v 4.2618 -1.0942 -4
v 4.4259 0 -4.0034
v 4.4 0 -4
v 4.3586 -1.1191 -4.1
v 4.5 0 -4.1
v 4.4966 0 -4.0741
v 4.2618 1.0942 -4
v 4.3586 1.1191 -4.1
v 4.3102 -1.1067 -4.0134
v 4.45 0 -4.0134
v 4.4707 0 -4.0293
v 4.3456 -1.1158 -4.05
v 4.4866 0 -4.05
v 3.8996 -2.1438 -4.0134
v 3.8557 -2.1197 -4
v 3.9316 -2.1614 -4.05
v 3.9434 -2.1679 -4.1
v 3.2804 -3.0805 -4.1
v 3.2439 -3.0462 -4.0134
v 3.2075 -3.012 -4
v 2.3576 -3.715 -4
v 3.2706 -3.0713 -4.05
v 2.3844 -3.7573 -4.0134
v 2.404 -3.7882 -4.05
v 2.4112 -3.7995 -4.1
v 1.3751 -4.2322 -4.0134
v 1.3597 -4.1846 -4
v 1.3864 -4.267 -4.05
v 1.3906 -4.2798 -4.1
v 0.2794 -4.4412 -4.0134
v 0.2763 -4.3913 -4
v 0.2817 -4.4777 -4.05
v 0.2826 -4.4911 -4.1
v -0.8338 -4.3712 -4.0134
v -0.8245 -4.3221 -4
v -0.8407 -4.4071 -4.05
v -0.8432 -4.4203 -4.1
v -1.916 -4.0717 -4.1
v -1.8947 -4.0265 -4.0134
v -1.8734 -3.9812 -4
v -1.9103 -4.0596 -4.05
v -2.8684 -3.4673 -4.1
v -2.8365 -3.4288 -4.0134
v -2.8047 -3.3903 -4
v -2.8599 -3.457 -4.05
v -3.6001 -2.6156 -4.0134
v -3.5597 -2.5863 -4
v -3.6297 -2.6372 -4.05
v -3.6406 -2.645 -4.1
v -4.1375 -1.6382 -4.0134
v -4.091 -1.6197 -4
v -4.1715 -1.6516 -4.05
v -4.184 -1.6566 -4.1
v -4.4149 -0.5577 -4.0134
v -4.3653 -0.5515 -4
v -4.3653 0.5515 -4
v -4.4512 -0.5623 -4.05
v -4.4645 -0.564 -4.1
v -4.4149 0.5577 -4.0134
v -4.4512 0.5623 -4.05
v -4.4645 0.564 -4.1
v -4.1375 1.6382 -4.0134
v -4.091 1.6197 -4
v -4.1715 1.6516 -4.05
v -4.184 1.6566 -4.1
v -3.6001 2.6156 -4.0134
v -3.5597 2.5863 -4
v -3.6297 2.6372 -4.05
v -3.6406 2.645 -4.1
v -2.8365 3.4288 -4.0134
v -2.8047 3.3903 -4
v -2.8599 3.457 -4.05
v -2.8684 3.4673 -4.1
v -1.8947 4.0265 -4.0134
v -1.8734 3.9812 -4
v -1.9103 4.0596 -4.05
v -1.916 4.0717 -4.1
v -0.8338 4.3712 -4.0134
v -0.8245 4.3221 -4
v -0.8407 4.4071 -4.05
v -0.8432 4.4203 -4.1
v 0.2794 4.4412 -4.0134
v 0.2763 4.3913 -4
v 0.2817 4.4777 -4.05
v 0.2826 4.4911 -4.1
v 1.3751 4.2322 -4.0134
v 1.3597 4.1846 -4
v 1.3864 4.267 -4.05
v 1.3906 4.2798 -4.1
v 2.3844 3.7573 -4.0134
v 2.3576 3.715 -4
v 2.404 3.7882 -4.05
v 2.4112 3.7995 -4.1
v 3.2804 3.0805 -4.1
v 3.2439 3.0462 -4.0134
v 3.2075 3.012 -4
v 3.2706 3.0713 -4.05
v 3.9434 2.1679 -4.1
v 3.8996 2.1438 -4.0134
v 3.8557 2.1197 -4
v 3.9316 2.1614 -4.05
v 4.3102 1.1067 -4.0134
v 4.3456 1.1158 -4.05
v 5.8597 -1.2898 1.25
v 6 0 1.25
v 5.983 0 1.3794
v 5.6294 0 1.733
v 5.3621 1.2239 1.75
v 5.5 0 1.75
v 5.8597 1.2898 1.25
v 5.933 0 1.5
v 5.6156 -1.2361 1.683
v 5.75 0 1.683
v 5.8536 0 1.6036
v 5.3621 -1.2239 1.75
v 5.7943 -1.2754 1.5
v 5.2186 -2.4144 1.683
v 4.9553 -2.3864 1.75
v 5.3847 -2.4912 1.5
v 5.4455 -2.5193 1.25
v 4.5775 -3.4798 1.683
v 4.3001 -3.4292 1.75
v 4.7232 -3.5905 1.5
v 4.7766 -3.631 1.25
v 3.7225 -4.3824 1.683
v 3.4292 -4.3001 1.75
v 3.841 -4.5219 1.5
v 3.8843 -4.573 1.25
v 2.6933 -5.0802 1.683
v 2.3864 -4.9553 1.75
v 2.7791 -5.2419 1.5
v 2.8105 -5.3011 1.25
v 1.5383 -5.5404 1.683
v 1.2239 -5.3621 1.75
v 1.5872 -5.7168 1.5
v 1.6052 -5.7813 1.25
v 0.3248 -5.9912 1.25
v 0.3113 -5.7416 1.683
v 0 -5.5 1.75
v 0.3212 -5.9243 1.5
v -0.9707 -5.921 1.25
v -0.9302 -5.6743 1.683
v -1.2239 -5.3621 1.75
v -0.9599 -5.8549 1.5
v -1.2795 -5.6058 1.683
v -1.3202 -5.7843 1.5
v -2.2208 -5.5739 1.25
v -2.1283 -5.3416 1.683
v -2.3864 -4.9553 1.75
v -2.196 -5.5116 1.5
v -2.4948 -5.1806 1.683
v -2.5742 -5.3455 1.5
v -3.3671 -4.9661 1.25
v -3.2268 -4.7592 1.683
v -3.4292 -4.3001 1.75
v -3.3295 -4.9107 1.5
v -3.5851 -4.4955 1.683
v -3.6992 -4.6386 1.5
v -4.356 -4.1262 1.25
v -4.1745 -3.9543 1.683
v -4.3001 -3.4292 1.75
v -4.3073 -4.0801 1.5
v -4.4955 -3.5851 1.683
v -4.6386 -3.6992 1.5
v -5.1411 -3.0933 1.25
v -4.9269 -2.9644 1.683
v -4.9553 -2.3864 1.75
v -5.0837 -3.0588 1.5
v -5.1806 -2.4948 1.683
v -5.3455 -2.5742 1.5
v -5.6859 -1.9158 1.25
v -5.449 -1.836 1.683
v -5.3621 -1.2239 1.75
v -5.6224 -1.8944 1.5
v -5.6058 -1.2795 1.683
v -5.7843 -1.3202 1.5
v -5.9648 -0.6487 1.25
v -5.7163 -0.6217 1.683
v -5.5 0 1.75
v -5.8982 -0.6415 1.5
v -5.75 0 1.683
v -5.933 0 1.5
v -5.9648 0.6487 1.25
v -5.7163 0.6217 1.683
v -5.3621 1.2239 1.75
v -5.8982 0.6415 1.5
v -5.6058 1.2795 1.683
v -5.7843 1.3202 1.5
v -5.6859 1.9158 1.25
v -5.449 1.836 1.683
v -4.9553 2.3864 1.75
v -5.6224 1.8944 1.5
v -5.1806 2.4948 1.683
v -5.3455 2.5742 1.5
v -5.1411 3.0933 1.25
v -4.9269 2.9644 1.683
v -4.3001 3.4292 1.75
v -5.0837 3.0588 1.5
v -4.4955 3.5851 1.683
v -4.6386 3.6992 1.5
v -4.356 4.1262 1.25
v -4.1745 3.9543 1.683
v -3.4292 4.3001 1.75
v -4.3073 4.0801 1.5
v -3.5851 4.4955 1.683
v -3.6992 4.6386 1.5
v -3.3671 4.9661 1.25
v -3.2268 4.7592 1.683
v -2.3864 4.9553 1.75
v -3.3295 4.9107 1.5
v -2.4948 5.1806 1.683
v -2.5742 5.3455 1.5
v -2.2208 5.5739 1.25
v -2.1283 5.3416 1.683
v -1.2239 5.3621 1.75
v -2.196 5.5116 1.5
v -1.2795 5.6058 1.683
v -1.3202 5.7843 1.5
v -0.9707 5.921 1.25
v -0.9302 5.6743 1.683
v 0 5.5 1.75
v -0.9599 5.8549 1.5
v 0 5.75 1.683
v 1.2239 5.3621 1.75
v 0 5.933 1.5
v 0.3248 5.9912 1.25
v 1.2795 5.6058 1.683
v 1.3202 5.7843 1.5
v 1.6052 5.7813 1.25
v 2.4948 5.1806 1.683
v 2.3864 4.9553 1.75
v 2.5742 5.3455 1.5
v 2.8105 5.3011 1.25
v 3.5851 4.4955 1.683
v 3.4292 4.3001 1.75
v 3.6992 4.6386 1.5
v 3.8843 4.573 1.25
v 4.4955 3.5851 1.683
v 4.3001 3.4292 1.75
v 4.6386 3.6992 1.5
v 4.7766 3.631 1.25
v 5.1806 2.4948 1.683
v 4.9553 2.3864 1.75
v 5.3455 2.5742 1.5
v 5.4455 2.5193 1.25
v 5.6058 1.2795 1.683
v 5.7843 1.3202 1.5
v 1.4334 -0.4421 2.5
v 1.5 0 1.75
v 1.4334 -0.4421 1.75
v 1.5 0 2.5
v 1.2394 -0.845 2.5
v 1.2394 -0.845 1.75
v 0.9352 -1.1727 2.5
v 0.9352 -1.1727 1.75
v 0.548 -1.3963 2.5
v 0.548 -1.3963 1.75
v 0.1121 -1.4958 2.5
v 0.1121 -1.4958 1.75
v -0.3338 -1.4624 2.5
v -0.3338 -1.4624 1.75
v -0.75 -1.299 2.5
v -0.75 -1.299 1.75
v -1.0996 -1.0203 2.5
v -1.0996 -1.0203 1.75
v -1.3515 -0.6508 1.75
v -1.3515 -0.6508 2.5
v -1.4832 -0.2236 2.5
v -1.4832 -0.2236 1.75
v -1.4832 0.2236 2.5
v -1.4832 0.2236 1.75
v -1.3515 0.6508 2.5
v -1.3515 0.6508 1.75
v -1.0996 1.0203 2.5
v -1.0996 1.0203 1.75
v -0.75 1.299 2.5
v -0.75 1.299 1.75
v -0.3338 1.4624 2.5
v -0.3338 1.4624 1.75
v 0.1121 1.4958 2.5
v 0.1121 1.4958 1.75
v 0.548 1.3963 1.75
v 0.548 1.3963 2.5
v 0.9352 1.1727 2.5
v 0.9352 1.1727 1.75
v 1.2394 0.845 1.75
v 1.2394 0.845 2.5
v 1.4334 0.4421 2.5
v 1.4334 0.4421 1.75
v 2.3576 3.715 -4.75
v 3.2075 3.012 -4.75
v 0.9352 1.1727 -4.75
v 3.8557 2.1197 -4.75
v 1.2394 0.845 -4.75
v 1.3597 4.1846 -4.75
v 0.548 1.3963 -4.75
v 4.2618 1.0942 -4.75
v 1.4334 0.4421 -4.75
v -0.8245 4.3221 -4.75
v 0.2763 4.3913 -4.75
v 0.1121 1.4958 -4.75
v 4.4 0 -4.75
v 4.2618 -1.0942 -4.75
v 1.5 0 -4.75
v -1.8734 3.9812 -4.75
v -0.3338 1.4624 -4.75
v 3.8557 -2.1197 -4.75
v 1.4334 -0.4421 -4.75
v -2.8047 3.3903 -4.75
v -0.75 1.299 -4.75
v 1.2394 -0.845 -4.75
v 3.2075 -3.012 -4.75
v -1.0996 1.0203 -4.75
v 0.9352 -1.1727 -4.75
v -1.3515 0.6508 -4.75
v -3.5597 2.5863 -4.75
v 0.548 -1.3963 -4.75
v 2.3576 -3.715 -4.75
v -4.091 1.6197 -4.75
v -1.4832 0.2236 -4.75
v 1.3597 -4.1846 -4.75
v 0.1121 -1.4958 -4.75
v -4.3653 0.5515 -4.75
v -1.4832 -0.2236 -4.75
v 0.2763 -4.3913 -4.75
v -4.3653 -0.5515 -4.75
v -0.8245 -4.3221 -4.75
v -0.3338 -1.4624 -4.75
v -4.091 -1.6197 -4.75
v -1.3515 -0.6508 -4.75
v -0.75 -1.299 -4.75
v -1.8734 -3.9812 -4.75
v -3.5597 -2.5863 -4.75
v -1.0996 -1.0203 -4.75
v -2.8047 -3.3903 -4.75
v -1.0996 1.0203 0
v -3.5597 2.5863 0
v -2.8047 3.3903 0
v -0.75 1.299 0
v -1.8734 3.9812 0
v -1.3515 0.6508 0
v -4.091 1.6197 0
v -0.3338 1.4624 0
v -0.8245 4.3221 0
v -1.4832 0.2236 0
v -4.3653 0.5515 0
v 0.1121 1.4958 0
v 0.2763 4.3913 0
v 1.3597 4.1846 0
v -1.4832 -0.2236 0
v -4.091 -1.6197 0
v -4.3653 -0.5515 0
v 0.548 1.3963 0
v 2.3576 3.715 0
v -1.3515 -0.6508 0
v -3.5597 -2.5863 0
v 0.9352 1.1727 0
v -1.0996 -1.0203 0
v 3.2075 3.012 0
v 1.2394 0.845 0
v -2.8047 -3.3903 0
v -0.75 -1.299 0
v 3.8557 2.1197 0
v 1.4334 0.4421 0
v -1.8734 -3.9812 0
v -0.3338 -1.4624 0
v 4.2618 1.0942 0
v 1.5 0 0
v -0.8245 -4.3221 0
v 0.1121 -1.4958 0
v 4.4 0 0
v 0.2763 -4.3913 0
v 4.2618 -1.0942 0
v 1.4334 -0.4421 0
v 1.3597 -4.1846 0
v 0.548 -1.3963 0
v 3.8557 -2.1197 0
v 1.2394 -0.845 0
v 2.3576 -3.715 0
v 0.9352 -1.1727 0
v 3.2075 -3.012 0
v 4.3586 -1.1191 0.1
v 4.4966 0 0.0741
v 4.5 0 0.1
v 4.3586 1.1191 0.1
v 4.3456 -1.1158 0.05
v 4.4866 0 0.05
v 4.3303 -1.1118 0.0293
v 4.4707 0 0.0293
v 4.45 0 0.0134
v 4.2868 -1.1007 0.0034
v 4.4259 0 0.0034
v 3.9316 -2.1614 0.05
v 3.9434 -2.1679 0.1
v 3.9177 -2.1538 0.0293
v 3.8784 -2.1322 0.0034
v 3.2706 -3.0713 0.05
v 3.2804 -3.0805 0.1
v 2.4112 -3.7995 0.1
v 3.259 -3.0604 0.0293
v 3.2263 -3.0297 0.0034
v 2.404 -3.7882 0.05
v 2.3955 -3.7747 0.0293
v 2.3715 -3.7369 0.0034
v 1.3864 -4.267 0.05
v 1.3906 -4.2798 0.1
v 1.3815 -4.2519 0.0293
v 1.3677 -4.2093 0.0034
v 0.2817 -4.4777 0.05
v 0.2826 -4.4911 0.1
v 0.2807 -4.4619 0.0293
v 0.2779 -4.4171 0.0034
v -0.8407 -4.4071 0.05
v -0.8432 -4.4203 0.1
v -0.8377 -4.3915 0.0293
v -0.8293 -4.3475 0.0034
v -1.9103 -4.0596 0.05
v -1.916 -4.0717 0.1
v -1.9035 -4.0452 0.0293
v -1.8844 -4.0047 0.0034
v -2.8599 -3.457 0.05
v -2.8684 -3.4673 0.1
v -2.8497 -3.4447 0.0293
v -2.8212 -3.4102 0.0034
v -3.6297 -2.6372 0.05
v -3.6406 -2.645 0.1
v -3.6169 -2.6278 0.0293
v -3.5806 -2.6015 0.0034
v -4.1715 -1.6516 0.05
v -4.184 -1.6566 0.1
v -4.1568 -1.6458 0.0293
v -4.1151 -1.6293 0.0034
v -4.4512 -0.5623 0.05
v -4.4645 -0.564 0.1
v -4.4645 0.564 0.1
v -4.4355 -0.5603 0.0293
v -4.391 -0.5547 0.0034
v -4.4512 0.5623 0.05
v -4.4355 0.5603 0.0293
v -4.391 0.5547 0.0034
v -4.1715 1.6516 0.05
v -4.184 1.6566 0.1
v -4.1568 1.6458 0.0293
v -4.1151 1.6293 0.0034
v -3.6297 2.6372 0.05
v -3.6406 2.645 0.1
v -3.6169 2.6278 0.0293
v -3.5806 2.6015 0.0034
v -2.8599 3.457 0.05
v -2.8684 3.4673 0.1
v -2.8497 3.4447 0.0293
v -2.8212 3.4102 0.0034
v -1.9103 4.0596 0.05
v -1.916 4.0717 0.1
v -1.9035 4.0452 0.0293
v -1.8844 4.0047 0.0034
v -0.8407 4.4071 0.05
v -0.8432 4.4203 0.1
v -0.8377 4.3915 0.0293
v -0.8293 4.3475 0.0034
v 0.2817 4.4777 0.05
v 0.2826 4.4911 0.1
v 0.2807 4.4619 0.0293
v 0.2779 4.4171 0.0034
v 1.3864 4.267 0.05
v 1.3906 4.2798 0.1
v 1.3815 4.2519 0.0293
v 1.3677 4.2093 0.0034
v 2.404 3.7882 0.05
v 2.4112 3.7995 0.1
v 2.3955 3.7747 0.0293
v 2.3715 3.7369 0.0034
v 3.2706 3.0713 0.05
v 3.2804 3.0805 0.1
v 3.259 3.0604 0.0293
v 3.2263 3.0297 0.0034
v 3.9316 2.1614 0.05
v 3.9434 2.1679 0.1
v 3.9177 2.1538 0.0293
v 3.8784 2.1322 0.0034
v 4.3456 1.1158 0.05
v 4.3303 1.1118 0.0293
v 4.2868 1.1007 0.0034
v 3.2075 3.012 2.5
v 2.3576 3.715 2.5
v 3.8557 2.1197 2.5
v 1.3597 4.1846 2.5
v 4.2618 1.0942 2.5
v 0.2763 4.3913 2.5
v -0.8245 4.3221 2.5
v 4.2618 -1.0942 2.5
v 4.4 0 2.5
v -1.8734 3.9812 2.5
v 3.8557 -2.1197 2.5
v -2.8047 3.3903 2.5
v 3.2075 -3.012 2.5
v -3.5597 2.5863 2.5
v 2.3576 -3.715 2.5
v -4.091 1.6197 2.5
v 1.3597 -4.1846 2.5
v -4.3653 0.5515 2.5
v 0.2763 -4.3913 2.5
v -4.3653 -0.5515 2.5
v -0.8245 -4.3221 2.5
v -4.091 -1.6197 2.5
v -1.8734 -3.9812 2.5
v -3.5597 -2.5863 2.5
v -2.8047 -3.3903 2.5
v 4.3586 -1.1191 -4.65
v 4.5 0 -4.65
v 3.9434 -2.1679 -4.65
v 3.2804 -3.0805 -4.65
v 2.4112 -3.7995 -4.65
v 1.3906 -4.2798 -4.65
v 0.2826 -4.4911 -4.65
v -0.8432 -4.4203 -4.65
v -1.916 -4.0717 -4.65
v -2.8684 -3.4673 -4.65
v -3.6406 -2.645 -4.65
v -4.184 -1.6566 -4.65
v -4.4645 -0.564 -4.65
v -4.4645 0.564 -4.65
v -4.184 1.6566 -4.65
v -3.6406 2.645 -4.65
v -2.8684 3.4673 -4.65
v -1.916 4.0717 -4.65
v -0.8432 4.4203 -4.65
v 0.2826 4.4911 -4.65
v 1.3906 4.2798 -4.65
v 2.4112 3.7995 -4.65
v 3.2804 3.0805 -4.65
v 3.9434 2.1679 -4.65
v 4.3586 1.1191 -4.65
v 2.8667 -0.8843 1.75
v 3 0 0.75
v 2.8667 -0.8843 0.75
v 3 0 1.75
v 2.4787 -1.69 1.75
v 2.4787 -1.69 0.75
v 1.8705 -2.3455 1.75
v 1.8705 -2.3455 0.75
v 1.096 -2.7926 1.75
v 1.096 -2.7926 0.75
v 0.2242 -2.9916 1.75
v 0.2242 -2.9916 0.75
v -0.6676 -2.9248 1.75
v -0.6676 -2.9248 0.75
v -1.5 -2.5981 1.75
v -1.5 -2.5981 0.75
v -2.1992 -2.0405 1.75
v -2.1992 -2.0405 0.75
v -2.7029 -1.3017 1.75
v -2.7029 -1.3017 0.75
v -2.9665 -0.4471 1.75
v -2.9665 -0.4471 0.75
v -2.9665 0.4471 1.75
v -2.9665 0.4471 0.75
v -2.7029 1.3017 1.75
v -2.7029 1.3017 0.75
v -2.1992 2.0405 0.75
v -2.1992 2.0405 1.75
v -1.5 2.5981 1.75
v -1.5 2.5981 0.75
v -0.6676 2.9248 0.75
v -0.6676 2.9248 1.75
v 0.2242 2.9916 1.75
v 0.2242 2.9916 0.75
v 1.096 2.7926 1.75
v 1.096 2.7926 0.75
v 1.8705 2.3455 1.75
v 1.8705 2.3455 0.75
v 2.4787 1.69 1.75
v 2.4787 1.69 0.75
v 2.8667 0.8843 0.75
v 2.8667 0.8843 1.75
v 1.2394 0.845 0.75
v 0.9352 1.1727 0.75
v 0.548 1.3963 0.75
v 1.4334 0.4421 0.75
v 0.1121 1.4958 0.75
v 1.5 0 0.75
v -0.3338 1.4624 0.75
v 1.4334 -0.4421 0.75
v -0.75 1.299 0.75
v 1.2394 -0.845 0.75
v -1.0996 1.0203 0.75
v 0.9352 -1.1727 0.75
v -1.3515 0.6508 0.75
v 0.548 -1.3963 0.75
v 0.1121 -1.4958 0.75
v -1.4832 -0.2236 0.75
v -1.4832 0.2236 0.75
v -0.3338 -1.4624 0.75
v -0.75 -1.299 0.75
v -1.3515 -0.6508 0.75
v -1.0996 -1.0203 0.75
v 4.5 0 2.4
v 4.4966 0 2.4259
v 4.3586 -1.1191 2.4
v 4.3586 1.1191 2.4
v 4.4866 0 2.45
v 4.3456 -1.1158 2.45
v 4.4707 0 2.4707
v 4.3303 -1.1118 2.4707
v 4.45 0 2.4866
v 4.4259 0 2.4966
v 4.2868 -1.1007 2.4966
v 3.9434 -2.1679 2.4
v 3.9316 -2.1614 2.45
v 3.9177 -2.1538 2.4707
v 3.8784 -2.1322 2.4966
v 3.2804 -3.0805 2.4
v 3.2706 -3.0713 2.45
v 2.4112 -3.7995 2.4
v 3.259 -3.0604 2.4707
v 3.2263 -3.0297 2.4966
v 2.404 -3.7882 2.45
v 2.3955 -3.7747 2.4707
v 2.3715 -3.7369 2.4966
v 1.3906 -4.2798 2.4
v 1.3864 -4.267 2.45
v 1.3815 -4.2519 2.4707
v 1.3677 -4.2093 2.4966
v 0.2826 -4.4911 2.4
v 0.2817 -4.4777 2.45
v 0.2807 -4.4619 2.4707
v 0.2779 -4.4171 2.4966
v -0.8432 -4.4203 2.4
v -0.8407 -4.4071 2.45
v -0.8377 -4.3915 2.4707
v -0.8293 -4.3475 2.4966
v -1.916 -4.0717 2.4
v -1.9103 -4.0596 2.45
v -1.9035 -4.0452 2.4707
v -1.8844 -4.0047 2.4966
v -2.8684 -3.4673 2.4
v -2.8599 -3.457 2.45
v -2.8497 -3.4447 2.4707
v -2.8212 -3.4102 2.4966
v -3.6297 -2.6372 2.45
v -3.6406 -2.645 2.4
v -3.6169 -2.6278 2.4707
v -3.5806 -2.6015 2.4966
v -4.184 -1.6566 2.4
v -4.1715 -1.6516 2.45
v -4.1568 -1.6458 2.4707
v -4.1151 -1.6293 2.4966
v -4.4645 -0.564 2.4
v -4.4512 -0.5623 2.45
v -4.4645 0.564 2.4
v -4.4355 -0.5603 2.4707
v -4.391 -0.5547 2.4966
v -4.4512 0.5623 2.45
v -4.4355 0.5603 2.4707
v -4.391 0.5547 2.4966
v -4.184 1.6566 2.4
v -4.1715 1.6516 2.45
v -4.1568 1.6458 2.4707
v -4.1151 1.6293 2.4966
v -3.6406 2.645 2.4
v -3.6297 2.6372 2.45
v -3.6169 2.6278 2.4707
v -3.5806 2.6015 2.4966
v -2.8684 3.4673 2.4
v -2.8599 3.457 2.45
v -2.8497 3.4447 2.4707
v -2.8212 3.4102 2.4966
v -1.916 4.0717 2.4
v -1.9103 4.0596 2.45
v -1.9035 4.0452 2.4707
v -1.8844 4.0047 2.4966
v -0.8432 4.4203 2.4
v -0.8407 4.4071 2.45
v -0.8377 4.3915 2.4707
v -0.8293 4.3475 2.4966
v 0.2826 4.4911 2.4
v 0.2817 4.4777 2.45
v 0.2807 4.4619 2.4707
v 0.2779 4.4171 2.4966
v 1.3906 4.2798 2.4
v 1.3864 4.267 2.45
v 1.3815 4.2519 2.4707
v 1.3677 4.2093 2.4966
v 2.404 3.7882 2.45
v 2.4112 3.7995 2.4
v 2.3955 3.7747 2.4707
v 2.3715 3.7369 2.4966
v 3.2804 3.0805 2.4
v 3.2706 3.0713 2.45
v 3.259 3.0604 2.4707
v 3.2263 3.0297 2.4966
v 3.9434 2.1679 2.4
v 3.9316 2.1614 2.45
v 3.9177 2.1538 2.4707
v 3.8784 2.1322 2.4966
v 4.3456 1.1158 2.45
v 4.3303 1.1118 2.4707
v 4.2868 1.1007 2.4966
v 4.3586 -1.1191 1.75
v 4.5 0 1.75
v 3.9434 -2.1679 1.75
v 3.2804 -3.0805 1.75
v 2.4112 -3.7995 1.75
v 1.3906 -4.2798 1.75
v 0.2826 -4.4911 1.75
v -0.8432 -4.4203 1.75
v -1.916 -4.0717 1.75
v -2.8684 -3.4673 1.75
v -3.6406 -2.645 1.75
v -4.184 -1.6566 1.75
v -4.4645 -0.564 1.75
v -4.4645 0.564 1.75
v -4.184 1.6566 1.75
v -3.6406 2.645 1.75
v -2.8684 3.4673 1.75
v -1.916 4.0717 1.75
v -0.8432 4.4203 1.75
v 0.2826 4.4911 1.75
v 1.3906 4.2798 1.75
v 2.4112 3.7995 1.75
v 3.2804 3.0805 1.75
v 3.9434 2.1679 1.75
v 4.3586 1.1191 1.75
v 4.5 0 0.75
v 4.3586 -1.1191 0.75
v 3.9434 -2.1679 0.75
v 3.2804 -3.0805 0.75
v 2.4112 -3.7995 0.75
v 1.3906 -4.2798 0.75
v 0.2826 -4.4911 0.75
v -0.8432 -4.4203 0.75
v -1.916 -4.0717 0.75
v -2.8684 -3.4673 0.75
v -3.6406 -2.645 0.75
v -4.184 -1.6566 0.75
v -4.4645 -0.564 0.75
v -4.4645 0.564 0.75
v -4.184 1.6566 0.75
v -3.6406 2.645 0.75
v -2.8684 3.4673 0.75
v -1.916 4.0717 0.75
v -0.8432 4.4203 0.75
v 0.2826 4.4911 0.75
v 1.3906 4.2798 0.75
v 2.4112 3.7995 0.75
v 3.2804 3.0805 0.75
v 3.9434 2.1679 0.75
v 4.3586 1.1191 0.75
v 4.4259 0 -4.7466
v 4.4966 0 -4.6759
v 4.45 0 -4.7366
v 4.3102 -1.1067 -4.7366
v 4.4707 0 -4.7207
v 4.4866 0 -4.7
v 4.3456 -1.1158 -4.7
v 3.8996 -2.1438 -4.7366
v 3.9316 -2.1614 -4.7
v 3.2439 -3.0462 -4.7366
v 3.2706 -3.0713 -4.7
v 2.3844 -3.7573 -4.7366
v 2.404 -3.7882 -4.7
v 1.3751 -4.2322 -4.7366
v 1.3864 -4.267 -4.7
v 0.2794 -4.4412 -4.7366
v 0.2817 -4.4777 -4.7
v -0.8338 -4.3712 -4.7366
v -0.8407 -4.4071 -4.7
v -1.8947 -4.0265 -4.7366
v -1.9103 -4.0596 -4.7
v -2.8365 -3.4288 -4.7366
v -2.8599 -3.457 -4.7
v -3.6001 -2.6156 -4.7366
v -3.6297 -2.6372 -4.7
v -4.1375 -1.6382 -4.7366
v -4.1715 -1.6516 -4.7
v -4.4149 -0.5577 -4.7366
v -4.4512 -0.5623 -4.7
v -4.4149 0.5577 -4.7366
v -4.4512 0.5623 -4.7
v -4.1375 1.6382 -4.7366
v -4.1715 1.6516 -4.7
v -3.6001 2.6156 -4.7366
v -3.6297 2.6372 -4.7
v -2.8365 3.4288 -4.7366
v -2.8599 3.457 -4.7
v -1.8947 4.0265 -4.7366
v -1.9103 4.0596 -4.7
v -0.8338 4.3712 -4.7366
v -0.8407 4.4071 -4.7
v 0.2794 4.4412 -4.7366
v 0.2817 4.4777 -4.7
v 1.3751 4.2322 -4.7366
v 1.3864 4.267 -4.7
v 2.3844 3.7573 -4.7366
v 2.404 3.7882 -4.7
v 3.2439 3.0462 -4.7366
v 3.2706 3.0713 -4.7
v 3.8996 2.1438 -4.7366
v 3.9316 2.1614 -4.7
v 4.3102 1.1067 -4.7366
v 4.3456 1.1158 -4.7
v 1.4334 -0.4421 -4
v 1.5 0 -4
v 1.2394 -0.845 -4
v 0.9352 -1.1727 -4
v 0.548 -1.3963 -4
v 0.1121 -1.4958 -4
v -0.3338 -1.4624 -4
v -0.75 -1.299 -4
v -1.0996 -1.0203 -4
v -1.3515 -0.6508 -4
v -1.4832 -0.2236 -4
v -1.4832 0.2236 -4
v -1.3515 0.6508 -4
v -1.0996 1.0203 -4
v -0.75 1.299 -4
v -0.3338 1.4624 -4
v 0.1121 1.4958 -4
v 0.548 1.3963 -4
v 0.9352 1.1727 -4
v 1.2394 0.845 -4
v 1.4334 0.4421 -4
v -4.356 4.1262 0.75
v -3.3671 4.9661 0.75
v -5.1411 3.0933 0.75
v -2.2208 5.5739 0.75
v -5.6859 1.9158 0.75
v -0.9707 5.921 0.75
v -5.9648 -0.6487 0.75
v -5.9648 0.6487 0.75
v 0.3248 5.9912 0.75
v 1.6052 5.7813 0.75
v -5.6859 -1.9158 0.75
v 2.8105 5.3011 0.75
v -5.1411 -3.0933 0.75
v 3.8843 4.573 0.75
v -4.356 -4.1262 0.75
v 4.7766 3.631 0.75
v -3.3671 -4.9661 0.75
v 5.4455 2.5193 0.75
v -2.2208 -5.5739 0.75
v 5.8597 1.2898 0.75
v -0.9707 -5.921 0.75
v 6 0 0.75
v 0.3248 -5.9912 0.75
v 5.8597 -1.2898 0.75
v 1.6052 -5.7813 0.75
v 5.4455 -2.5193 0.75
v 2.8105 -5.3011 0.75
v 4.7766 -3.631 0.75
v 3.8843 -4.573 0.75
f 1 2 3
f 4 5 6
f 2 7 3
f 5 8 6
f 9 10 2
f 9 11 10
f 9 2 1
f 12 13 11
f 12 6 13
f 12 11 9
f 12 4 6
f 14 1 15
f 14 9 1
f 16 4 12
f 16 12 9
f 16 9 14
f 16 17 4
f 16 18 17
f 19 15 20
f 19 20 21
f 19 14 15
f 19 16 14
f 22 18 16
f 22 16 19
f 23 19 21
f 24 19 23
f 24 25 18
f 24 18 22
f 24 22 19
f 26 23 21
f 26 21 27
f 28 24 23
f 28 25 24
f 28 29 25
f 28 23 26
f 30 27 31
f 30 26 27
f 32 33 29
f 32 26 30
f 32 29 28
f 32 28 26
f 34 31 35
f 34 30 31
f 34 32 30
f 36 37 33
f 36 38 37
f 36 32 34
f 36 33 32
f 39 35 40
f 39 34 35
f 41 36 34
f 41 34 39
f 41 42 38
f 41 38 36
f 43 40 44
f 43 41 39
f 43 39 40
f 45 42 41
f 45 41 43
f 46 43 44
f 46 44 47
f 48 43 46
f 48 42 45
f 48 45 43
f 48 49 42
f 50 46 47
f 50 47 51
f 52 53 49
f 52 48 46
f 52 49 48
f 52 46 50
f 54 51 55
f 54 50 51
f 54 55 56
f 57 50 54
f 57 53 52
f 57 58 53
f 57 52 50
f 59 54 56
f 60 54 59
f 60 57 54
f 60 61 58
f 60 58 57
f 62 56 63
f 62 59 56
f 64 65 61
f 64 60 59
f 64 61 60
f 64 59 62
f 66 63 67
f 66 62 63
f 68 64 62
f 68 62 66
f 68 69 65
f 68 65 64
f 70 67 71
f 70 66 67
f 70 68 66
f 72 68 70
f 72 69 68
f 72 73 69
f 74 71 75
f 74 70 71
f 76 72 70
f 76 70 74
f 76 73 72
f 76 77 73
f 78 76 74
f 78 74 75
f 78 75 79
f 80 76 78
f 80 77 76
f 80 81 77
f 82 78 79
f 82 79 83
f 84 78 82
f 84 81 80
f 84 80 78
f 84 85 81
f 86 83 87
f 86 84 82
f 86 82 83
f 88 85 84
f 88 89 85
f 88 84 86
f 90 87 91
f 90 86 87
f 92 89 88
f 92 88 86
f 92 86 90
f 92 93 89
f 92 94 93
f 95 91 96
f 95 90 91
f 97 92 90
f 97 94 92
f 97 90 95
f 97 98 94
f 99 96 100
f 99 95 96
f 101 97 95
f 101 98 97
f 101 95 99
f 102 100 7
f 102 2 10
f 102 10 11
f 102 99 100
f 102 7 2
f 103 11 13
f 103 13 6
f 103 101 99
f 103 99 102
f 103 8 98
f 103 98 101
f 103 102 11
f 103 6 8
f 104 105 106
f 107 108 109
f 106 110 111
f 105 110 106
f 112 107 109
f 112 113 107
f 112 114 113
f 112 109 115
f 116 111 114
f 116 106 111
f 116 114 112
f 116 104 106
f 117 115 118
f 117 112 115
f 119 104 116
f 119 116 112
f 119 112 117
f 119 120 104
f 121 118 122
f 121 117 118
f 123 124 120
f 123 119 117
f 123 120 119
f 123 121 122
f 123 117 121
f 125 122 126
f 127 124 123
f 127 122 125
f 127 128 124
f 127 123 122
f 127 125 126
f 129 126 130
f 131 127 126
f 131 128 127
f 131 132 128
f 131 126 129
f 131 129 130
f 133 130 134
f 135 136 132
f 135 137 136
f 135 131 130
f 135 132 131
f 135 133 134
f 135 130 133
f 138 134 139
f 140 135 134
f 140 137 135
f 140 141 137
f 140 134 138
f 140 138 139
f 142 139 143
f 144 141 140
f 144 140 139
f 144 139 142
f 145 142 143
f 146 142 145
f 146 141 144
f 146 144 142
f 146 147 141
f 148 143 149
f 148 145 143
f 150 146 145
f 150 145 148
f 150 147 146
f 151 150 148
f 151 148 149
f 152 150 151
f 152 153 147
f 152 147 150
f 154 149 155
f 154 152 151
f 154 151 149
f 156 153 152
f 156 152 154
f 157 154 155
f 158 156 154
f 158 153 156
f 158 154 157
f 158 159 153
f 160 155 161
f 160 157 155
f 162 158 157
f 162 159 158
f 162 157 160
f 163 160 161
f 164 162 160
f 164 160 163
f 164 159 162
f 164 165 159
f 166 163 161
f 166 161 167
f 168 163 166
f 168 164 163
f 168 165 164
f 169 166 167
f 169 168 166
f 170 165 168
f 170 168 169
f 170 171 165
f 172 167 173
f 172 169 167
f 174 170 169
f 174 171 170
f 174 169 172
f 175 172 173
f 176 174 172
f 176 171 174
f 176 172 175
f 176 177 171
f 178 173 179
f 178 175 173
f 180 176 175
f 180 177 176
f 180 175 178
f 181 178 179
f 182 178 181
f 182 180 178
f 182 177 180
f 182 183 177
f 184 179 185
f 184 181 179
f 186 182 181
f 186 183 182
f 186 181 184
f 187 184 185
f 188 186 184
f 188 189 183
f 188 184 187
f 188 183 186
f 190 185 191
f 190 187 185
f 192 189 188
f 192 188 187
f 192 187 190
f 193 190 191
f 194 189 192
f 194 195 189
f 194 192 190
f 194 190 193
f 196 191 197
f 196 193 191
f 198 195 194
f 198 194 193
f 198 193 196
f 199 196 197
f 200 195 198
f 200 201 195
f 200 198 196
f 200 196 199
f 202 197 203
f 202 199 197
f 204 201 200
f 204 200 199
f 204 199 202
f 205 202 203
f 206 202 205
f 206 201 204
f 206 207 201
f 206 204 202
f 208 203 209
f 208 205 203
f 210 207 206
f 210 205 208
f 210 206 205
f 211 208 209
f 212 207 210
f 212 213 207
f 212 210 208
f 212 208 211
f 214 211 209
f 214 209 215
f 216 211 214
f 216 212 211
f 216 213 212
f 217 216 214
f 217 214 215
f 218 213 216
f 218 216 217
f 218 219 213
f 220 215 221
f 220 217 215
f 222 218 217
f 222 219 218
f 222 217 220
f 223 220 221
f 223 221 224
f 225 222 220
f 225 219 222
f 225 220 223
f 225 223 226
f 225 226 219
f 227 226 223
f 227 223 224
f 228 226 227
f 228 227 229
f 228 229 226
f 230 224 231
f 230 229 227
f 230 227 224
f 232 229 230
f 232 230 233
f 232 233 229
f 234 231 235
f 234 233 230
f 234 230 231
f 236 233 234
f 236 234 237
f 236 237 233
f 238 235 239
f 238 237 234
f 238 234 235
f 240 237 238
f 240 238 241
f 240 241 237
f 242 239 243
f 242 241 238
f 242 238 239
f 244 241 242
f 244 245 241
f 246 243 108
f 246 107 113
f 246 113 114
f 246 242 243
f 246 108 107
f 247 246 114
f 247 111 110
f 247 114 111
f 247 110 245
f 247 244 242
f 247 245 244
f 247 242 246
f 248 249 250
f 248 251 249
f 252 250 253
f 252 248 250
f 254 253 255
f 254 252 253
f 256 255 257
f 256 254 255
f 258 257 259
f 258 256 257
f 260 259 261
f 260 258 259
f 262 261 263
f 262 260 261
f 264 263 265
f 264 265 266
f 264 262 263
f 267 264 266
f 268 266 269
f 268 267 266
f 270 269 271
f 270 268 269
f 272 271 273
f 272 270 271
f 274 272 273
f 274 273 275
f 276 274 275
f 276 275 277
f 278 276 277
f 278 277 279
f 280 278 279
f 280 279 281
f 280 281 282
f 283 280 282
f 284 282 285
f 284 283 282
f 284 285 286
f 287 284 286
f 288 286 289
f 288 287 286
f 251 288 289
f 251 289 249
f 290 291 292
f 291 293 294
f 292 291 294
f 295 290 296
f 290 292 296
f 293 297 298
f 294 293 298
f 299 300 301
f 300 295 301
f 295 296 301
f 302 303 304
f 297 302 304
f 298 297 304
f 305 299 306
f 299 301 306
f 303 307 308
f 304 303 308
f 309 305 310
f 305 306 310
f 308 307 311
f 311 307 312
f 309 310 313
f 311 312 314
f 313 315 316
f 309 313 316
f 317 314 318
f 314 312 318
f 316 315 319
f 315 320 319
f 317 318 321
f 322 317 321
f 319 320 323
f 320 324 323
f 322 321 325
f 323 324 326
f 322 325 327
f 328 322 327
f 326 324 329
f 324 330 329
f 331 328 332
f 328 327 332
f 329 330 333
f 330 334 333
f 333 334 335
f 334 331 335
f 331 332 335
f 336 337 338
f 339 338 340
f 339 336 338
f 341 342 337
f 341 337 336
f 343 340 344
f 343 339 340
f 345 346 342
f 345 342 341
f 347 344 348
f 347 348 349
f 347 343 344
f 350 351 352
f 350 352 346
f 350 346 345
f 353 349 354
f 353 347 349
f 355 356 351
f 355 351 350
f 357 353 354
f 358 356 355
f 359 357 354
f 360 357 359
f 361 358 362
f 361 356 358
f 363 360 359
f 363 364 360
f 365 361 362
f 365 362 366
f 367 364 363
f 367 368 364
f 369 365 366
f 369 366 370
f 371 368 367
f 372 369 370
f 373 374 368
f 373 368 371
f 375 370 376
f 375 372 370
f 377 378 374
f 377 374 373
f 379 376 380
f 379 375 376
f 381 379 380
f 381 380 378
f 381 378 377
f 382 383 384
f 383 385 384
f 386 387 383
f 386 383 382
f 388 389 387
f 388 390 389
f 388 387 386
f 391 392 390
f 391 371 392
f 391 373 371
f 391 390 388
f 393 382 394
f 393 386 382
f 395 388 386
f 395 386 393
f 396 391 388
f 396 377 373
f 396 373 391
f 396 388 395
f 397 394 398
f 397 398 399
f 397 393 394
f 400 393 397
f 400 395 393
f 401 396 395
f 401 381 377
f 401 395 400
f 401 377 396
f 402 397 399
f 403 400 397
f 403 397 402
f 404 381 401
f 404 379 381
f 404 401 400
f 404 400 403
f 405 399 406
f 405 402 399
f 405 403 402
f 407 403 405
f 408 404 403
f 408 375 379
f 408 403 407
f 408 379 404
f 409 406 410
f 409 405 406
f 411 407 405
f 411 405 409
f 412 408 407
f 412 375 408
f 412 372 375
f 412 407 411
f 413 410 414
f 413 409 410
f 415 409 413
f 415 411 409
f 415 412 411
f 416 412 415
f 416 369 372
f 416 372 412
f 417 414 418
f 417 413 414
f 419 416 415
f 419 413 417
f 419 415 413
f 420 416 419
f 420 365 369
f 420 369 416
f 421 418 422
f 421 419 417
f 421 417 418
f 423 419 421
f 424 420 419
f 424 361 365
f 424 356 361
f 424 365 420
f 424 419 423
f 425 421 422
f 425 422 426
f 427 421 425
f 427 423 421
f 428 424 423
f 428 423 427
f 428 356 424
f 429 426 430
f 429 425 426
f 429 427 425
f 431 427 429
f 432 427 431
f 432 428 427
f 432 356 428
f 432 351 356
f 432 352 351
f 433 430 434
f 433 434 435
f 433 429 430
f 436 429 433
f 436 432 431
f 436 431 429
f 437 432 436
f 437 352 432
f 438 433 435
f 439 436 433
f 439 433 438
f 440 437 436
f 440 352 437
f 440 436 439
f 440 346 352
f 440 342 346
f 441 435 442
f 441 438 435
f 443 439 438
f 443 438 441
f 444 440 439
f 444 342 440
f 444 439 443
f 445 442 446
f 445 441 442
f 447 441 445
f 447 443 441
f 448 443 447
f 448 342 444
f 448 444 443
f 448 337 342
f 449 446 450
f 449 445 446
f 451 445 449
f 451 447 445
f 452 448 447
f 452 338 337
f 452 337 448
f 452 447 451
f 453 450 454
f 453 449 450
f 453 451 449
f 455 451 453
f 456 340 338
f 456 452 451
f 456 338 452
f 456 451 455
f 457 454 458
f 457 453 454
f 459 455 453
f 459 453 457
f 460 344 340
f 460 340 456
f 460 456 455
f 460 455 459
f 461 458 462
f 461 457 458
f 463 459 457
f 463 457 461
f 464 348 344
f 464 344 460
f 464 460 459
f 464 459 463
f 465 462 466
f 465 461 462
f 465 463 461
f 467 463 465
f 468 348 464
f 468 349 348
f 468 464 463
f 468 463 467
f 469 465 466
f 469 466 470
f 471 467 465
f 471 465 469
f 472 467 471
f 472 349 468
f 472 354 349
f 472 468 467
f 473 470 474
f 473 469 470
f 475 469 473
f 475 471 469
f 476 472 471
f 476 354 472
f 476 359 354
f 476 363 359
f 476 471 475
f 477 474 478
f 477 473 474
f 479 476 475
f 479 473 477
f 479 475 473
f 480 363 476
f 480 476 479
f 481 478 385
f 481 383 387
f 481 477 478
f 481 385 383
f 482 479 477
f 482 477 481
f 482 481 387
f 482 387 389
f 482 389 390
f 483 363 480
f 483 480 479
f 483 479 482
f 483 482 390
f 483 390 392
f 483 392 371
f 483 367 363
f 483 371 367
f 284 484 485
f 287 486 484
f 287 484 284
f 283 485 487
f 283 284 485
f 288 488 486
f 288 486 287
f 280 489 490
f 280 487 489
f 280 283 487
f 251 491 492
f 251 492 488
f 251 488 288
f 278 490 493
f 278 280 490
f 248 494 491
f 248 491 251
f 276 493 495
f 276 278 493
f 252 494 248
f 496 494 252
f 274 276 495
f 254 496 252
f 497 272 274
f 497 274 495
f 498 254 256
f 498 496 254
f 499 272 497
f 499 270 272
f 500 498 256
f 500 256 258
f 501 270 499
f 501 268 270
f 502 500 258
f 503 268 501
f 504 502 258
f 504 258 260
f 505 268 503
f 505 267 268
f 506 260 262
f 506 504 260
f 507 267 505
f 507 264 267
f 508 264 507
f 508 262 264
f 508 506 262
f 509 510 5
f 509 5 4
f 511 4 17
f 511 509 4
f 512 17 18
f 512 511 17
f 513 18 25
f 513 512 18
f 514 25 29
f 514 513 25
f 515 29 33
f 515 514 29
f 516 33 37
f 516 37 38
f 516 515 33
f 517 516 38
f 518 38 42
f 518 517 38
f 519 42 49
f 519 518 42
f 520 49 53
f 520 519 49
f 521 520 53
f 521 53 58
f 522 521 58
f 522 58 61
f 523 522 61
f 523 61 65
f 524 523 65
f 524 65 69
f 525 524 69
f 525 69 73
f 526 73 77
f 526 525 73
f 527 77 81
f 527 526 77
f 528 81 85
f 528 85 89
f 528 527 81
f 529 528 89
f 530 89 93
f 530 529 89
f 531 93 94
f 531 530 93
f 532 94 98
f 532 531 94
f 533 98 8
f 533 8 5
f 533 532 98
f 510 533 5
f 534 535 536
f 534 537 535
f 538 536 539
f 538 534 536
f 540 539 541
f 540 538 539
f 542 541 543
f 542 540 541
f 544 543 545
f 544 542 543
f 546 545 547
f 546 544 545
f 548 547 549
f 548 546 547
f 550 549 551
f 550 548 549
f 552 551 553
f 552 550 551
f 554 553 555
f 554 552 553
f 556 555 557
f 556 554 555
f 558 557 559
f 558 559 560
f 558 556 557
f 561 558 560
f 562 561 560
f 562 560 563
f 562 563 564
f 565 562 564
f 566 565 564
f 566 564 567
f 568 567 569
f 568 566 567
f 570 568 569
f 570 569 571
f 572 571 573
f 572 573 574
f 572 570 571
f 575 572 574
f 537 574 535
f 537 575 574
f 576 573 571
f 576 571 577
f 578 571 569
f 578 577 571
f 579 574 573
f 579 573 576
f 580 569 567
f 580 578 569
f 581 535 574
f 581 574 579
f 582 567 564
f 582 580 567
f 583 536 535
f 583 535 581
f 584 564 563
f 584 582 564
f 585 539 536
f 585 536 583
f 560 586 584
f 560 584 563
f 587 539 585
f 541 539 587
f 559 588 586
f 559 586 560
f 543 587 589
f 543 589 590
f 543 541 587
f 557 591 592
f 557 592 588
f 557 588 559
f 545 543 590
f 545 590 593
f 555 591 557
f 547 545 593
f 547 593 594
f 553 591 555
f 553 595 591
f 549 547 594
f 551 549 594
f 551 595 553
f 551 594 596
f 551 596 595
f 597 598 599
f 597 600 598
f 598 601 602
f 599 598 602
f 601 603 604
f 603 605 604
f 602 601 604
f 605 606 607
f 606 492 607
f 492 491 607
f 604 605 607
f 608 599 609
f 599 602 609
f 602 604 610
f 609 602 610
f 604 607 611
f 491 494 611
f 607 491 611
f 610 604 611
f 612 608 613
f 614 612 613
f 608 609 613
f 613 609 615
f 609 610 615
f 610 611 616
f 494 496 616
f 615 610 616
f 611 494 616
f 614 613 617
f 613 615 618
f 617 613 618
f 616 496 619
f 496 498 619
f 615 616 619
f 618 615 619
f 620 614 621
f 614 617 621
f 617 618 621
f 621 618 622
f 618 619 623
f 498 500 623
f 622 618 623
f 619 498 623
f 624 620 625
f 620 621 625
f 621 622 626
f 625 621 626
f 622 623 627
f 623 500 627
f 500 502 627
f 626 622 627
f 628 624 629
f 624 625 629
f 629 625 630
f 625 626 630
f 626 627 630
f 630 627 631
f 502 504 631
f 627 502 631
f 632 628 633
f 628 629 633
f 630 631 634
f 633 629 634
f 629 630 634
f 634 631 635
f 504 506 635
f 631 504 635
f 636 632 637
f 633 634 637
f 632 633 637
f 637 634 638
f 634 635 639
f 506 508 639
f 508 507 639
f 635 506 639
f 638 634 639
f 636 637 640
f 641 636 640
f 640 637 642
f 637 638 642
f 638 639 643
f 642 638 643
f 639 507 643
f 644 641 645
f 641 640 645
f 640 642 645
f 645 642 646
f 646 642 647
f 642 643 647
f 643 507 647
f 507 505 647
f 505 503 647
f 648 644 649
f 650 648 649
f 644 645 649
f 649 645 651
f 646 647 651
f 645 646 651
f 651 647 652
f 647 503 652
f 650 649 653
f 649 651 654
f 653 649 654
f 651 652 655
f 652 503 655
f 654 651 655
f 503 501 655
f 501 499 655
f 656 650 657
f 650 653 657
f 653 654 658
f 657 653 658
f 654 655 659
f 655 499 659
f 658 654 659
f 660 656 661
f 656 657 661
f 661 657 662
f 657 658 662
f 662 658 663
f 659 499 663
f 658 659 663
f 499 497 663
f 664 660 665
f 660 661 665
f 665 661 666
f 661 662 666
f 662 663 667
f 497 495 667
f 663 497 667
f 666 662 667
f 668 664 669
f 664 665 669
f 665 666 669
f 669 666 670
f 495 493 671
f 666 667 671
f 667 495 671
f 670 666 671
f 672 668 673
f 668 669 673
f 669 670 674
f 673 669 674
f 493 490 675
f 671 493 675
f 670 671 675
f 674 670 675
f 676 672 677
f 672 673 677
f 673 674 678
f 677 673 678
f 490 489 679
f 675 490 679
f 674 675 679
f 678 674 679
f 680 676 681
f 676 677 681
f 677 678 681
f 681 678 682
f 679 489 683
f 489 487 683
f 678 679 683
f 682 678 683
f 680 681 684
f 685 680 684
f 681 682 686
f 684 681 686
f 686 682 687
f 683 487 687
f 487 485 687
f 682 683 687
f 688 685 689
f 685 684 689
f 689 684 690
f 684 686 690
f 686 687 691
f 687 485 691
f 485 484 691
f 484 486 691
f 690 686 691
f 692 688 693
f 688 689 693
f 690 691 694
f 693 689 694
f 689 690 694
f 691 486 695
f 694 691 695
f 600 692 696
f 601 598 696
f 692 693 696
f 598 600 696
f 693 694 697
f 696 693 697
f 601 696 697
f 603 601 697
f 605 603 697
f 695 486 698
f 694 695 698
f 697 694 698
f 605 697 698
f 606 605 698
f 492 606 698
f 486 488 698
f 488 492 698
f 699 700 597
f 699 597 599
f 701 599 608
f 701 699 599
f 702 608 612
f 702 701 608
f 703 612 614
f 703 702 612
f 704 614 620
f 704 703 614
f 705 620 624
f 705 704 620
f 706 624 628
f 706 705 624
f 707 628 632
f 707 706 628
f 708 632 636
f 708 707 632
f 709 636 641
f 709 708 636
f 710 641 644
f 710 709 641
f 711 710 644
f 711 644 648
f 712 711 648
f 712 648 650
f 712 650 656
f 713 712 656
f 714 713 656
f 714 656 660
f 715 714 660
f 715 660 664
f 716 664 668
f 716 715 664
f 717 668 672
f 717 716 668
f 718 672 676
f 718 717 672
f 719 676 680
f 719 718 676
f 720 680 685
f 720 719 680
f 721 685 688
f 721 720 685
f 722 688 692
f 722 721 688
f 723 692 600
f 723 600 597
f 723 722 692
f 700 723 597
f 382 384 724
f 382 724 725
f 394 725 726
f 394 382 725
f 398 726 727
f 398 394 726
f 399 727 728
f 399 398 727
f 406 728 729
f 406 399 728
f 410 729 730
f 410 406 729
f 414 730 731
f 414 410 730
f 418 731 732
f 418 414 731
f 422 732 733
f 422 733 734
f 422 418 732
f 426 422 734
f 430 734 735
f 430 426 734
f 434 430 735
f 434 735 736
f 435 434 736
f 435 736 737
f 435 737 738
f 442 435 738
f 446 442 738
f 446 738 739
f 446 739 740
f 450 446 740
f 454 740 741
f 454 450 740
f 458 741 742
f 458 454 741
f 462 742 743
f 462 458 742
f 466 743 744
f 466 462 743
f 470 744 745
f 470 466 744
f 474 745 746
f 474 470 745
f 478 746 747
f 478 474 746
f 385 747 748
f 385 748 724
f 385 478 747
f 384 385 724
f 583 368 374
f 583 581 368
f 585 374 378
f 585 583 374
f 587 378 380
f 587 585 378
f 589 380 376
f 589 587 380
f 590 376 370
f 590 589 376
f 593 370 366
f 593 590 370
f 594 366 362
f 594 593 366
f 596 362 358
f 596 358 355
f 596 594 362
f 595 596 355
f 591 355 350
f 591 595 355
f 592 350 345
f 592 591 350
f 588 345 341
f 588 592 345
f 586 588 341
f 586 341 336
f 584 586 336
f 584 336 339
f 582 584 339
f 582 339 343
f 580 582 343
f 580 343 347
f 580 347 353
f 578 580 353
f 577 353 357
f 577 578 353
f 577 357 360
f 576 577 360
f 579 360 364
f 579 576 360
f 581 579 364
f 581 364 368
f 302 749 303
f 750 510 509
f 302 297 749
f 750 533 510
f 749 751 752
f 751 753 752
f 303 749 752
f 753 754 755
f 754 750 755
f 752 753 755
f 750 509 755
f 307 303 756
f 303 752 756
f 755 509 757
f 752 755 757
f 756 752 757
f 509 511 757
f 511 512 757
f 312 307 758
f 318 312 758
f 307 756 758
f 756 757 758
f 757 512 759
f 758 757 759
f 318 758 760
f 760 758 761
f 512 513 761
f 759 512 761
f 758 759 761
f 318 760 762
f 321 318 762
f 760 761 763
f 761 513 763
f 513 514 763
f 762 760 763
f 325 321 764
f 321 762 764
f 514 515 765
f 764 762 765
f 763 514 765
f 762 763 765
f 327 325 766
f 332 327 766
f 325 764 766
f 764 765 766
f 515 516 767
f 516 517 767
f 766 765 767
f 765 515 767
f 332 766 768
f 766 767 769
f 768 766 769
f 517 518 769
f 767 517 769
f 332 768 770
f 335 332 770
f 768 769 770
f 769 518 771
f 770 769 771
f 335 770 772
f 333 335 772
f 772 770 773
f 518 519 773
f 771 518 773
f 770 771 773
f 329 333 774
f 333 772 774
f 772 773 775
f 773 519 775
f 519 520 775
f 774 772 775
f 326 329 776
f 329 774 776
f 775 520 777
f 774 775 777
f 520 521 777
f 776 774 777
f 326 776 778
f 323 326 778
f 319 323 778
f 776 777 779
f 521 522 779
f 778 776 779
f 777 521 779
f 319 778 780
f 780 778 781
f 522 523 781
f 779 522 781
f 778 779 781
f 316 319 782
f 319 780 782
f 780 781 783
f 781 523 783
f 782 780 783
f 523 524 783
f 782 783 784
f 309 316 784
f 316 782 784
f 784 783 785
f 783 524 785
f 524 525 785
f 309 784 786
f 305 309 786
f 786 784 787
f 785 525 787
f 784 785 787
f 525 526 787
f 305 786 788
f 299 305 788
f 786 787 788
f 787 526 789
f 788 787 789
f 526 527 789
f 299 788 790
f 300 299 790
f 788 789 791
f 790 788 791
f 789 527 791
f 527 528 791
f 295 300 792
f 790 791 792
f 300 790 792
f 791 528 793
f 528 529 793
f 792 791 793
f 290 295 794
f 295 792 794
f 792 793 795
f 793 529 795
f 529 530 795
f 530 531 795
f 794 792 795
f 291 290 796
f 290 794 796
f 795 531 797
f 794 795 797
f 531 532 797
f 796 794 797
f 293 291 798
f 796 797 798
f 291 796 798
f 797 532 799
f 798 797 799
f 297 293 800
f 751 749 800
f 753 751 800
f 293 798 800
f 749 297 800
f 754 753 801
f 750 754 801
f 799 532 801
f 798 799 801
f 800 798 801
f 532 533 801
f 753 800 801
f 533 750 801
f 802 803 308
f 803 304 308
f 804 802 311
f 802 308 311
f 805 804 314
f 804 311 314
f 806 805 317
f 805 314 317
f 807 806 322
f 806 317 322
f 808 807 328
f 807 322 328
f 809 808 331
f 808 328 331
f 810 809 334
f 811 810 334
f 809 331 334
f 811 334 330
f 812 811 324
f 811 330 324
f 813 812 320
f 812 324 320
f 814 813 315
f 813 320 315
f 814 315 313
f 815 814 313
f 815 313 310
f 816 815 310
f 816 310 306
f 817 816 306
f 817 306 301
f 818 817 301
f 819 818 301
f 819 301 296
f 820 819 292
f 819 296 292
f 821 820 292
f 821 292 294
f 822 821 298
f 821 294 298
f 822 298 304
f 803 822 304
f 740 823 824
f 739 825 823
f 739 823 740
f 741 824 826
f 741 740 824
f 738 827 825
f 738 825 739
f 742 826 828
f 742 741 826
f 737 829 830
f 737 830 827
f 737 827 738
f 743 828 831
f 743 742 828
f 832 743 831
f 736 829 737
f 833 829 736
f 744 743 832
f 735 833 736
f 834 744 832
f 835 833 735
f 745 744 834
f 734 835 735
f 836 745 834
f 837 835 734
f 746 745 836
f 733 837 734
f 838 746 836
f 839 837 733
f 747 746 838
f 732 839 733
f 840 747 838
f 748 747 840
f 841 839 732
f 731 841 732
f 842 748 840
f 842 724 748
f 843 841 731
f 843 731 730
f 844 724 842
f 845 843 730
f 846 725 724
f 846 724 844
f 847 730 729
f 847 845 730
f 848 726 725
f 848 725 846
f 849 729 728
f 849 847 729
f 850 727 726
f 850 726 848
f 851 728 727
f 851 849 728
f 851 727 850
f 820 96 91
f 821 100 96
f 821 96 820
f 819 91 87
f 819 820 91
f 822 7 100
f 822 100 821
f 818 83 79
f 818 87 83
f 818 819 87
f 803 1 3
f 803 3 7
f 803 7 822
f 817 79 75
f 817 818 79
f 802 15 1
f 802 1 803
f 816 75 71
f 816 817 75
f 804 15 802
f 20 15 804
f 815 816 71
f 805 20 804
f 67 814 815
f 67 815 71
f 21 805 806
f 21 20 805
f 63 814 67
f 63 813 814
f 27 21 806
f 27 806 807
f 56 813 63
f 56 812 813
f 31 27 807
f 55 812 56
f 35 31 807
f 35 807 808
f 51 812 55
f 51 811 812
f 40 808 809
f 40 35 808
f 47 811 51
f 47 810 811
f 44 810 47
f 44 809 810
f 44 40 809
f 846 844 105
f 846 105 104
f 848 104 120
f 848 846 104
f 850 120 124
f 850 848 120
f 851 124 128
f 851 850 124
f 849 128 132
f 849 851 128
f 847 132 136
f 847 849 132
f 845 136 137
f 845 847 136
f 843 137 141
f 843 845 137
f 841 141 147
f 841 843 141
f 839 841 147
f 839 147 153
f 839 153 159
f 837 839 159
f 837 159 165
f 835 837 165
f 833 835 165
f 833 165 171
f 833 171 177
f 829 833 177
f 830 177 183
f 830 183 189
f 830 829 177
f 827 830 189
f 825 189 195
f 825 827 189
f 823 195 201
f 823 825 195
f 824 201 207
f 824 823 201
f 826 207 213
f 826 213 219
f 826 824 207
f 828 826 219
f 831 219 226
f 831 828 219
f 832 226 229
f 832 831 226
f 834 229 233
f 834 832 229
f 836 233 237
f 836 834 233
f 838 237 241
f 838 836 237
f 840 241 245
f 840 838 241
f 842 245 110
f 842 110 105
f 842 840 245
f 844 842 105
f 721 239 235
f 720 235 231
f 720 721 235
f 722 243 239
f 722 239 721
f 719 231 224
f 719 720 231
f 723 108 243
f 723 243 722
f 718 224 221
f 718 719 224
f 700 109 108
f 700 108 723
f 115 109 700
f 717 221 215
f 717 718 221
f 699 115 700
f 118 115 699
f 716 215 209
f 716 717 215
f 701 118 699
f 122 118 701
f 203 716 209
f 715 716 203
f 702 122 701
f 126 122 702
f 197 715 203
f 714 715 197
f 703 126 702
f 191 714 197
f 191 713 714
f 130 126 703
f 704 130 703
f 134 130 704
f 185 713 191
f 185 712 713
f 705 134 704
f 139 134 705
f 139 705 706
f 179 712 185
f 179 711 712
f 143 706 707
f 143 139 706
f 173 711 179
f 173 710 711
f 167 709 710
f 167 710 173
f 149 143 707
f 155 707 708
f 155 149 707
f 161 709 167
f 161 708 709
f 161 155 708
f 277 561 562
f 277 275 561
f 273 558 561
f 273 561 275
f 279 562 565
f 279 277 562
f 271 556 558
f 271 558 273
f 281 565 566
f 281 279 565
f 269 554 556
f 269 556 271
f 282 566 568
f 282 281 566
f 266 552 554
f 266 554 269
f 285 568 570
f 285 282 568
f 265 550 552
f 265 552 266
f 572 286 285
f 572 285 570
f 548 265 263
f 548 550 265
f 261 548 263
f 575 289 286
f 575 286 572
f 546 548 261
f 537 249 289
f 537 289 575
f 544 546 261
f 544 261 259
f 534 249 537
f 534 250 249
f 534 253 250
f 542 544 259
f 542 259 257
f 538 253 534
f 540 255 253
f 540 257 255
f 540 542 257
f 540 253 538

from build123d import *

# Parameters (mm, degrees)
ESQUISSE1_W = 0.75
ESQUISSE1_H = 3
CONG_1_R    = 0.5
CONG_2_R    = 0.1
CONG_3_R    = 0.1


with BuildPart() as part:
    # Esquisse1 → Révolution1 (revolve)
    with BuildSketch(Plane(origin=(0, 0, 0), x_dir=(0, 0, -1), z_dir=(1, 0, 0)), mode=Mode.PRIVATE) as r_volution1_sk:
        Polygon((0, 1.5), (-0.75, 1.5), (-0.75, 3), (-1.75, 3), (-1.75, 1.5), (-2.5, 1.5), (-2.5, 4.5), (-1.75, 4.5), (-1.75, 6), (-0.75, 6), (-0.75, 4.5), (0, 4.5), align=None)
        with Locations((4.375, 3)):
            Rectangle(ESQUISSE1_W, ESQUISSE1_H)
    revolve(r_volution1_sk.sketch.rotate(Axis((0, 0, 20.5), (0, 0, -1)), 90), axis=Axis((0, 0, 20.5), (0, 0, -1)))

    # Congé1
    cong_1_edges = [part.edges().sort_by_distance(p)[0] for p in [
        (-6, 0, 1.75),
    ]]
    fillet(cong_1_edges, radius=CONG_1_R)

    # Congé2
    cong_2_edges = [part.edges().sort_by_distance(p)[0] for p in [
        (-4.5, 0, 2.5),
        (-4.5, 0, 0),
    ]]
    fillet(cong_2_edges, radius=CONG_2_R)

    # Congé3
    cong_3_edges = [part.edges().sort_by_distance(p)[0] for p in [
        (-4.5, 0, -4.75),
        (-4.5, 0, -4),
    ]]
    fillet(cong_3_edges, radius=CONG_3_R)


solid = part.part
